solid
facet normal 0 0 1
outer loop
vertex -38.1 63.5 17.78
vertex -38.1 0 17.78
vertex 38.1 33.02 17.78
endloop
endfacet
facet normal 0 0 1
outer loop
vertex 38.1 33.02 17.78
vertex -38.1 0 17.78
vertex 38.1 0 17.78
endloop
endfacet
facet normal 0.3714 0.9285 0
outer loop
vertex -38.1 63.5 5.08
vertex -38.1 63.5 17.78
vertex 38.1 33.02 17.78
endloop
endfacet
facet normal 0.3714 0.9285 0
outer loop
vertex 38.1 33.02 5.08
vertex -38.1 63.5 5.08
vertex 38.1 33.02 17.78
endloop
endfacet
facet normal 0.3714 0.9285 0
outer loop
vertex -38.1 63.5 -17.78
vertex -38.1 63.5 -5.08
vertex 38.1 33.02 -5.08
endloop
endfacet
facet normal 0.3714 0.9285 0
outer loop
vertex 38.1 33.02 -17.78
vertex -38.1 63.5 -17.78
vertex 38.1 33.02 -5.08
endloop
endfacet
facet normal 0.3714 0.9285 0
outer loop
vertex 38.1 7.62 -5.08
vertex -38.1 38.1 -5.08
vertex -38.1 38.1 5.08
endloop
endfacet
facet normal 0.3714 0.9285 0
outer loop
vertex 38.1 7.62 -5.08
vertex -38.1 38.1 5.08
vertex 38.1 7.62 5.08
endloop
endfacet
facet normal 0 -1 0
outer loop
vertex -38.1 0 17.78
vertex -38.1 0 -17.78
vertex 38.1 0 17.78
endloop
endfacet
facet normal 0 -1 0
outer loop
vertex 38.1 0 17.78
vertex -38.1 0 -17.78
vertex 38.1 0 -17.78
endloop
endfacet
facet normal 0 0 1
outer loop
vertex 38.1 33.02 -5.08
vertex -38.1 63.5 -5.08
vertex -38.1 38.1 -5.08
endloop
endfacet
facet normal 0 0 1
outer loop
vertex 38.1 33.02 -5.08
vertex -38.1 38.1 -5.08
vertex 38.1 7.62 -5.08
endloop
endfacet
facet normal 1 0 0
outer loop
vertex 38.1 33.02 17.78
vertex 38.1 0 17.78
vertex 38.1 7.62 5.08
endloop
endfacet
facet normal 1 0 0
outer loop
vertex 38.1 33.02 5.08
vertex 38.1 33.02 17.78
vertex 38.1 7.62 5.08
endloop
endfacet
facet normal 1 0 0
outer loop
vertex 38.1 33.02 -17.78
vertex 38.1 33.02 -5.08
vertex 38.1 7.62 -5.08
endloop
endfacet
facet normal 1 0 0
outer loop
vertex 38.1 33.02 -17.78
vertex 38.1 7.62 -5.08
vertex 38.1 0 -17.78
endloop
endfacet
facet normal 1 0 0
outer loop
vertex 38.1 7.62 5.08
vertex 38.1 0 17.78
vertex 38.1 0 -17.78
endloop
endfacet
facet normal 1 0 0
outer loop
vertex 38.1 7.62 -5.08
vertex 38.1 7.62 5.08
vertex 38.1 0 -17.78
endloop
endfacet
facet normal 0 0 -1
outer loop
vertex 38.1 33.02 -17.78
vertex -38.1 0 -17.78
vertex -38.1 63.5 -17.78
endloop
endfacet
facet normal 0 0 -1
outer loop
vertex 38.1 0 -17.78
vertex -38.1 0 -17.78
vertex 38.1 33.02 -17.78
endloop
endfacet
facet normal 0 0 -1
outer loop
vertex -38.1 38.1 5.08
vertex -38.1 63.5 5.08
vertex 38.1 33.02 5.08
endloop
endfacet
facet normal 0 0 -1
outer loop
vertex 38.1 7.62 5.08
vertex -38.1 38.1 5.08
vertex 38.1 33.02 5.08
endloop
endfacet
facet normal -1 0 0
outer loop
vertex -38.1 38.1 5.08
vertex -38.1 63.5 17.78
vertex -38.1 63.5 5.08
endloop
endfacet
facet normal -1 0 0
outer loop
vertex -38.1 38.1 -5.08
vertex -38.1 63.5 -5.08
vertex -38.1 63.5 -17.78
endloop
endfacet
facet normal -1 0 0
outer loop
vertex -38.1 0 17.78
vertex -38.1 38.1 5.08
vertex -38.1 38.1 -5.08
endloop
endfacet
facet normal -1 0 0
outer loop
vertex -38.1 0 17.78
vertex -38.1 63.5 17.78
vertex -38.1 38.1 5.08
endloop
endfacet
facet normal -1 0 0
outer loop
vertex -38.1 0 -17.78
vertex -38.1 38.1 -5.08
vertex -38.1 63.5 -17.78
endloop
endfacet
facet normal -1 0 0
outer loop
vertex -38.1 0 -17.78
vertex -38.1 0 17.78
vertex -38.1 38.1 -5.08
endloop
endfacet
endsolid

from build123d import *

# Parameters (mm, degrees)
SKETCH1_W               = 76.2
SKETCH1_H               = 35.56
BOSS_EXTRUDE1_DEPTH     = 63.5
SKETCH2_W               = 76.2
SKETCH2_H               = 10.16
CUT_EXTRUDE1_DEPTH      = 25.4
CUT_EXTRUDE2_DEPTH      = 10.16
CUT_EXTRUDE3_DEPTH      = 78.501223216
CUT_EXTRUDE3_DEPTH_BACK = 78.501223216


with BuildPart() as part:
    # Sketch1 → Boss-Extrude1 (new body)
    with BuildSketch(Plane(origin=(0, 0, 0), x_dir=(1, 0, 0), z_dir=(0, 1, 0))):
        Rectangle(SKETCH1_W, SKETCH1_H)
    extrude(amount=BOSS_EXTRUDE1_DEPTH)

    # Sketch2 → Cut-Extrude1 (cut)
    with BuildSketch(Plane(origin=(0, 63.5, 0), x_dir=(1, 0, 0), z_dir=(0, 1, 0))):
        Rectangle(SKETCH2_W, SKETCH2_H)
    extrude(amount=-CUT_EXTRUDE1_DEPTH, mode=Mode.SUBTRACT)

    # Sketch3 → Cut-Extrude2 (cut)
    with BuildSketch(Plane.XY.offset(-5.08)):
        Polygon((38.1, 7.62), (38.1, 38.1), (-38.1, 38.1), align=None)
    extrude(amount=CUT_EXTRUDE2_DEPTH, mode=Mode.SUBTRACT)

    # Sketch4 → Cut-Extrude3 (cut, two sides: drawn at the far end of the back side and taken through both)
    with BuildSketch(Plane(origin=(0, 0, 5.08), x_dir=(-1, 0, 0), z_dir=(0, 0, -1)).offset(-CUT_EXTRUDE3_DEPTH_BACK)):
        Polygon((38.1, 63.5), (-38.1, 33.02), (-38.1, 63.5), align=None)
    extrude(amount=CUT_EXTRUDE3_DEPTH + CUT_EXTRUDE3_DEPTH_BACK, mode=Mode.SUBTRACT)


solid = part.part
